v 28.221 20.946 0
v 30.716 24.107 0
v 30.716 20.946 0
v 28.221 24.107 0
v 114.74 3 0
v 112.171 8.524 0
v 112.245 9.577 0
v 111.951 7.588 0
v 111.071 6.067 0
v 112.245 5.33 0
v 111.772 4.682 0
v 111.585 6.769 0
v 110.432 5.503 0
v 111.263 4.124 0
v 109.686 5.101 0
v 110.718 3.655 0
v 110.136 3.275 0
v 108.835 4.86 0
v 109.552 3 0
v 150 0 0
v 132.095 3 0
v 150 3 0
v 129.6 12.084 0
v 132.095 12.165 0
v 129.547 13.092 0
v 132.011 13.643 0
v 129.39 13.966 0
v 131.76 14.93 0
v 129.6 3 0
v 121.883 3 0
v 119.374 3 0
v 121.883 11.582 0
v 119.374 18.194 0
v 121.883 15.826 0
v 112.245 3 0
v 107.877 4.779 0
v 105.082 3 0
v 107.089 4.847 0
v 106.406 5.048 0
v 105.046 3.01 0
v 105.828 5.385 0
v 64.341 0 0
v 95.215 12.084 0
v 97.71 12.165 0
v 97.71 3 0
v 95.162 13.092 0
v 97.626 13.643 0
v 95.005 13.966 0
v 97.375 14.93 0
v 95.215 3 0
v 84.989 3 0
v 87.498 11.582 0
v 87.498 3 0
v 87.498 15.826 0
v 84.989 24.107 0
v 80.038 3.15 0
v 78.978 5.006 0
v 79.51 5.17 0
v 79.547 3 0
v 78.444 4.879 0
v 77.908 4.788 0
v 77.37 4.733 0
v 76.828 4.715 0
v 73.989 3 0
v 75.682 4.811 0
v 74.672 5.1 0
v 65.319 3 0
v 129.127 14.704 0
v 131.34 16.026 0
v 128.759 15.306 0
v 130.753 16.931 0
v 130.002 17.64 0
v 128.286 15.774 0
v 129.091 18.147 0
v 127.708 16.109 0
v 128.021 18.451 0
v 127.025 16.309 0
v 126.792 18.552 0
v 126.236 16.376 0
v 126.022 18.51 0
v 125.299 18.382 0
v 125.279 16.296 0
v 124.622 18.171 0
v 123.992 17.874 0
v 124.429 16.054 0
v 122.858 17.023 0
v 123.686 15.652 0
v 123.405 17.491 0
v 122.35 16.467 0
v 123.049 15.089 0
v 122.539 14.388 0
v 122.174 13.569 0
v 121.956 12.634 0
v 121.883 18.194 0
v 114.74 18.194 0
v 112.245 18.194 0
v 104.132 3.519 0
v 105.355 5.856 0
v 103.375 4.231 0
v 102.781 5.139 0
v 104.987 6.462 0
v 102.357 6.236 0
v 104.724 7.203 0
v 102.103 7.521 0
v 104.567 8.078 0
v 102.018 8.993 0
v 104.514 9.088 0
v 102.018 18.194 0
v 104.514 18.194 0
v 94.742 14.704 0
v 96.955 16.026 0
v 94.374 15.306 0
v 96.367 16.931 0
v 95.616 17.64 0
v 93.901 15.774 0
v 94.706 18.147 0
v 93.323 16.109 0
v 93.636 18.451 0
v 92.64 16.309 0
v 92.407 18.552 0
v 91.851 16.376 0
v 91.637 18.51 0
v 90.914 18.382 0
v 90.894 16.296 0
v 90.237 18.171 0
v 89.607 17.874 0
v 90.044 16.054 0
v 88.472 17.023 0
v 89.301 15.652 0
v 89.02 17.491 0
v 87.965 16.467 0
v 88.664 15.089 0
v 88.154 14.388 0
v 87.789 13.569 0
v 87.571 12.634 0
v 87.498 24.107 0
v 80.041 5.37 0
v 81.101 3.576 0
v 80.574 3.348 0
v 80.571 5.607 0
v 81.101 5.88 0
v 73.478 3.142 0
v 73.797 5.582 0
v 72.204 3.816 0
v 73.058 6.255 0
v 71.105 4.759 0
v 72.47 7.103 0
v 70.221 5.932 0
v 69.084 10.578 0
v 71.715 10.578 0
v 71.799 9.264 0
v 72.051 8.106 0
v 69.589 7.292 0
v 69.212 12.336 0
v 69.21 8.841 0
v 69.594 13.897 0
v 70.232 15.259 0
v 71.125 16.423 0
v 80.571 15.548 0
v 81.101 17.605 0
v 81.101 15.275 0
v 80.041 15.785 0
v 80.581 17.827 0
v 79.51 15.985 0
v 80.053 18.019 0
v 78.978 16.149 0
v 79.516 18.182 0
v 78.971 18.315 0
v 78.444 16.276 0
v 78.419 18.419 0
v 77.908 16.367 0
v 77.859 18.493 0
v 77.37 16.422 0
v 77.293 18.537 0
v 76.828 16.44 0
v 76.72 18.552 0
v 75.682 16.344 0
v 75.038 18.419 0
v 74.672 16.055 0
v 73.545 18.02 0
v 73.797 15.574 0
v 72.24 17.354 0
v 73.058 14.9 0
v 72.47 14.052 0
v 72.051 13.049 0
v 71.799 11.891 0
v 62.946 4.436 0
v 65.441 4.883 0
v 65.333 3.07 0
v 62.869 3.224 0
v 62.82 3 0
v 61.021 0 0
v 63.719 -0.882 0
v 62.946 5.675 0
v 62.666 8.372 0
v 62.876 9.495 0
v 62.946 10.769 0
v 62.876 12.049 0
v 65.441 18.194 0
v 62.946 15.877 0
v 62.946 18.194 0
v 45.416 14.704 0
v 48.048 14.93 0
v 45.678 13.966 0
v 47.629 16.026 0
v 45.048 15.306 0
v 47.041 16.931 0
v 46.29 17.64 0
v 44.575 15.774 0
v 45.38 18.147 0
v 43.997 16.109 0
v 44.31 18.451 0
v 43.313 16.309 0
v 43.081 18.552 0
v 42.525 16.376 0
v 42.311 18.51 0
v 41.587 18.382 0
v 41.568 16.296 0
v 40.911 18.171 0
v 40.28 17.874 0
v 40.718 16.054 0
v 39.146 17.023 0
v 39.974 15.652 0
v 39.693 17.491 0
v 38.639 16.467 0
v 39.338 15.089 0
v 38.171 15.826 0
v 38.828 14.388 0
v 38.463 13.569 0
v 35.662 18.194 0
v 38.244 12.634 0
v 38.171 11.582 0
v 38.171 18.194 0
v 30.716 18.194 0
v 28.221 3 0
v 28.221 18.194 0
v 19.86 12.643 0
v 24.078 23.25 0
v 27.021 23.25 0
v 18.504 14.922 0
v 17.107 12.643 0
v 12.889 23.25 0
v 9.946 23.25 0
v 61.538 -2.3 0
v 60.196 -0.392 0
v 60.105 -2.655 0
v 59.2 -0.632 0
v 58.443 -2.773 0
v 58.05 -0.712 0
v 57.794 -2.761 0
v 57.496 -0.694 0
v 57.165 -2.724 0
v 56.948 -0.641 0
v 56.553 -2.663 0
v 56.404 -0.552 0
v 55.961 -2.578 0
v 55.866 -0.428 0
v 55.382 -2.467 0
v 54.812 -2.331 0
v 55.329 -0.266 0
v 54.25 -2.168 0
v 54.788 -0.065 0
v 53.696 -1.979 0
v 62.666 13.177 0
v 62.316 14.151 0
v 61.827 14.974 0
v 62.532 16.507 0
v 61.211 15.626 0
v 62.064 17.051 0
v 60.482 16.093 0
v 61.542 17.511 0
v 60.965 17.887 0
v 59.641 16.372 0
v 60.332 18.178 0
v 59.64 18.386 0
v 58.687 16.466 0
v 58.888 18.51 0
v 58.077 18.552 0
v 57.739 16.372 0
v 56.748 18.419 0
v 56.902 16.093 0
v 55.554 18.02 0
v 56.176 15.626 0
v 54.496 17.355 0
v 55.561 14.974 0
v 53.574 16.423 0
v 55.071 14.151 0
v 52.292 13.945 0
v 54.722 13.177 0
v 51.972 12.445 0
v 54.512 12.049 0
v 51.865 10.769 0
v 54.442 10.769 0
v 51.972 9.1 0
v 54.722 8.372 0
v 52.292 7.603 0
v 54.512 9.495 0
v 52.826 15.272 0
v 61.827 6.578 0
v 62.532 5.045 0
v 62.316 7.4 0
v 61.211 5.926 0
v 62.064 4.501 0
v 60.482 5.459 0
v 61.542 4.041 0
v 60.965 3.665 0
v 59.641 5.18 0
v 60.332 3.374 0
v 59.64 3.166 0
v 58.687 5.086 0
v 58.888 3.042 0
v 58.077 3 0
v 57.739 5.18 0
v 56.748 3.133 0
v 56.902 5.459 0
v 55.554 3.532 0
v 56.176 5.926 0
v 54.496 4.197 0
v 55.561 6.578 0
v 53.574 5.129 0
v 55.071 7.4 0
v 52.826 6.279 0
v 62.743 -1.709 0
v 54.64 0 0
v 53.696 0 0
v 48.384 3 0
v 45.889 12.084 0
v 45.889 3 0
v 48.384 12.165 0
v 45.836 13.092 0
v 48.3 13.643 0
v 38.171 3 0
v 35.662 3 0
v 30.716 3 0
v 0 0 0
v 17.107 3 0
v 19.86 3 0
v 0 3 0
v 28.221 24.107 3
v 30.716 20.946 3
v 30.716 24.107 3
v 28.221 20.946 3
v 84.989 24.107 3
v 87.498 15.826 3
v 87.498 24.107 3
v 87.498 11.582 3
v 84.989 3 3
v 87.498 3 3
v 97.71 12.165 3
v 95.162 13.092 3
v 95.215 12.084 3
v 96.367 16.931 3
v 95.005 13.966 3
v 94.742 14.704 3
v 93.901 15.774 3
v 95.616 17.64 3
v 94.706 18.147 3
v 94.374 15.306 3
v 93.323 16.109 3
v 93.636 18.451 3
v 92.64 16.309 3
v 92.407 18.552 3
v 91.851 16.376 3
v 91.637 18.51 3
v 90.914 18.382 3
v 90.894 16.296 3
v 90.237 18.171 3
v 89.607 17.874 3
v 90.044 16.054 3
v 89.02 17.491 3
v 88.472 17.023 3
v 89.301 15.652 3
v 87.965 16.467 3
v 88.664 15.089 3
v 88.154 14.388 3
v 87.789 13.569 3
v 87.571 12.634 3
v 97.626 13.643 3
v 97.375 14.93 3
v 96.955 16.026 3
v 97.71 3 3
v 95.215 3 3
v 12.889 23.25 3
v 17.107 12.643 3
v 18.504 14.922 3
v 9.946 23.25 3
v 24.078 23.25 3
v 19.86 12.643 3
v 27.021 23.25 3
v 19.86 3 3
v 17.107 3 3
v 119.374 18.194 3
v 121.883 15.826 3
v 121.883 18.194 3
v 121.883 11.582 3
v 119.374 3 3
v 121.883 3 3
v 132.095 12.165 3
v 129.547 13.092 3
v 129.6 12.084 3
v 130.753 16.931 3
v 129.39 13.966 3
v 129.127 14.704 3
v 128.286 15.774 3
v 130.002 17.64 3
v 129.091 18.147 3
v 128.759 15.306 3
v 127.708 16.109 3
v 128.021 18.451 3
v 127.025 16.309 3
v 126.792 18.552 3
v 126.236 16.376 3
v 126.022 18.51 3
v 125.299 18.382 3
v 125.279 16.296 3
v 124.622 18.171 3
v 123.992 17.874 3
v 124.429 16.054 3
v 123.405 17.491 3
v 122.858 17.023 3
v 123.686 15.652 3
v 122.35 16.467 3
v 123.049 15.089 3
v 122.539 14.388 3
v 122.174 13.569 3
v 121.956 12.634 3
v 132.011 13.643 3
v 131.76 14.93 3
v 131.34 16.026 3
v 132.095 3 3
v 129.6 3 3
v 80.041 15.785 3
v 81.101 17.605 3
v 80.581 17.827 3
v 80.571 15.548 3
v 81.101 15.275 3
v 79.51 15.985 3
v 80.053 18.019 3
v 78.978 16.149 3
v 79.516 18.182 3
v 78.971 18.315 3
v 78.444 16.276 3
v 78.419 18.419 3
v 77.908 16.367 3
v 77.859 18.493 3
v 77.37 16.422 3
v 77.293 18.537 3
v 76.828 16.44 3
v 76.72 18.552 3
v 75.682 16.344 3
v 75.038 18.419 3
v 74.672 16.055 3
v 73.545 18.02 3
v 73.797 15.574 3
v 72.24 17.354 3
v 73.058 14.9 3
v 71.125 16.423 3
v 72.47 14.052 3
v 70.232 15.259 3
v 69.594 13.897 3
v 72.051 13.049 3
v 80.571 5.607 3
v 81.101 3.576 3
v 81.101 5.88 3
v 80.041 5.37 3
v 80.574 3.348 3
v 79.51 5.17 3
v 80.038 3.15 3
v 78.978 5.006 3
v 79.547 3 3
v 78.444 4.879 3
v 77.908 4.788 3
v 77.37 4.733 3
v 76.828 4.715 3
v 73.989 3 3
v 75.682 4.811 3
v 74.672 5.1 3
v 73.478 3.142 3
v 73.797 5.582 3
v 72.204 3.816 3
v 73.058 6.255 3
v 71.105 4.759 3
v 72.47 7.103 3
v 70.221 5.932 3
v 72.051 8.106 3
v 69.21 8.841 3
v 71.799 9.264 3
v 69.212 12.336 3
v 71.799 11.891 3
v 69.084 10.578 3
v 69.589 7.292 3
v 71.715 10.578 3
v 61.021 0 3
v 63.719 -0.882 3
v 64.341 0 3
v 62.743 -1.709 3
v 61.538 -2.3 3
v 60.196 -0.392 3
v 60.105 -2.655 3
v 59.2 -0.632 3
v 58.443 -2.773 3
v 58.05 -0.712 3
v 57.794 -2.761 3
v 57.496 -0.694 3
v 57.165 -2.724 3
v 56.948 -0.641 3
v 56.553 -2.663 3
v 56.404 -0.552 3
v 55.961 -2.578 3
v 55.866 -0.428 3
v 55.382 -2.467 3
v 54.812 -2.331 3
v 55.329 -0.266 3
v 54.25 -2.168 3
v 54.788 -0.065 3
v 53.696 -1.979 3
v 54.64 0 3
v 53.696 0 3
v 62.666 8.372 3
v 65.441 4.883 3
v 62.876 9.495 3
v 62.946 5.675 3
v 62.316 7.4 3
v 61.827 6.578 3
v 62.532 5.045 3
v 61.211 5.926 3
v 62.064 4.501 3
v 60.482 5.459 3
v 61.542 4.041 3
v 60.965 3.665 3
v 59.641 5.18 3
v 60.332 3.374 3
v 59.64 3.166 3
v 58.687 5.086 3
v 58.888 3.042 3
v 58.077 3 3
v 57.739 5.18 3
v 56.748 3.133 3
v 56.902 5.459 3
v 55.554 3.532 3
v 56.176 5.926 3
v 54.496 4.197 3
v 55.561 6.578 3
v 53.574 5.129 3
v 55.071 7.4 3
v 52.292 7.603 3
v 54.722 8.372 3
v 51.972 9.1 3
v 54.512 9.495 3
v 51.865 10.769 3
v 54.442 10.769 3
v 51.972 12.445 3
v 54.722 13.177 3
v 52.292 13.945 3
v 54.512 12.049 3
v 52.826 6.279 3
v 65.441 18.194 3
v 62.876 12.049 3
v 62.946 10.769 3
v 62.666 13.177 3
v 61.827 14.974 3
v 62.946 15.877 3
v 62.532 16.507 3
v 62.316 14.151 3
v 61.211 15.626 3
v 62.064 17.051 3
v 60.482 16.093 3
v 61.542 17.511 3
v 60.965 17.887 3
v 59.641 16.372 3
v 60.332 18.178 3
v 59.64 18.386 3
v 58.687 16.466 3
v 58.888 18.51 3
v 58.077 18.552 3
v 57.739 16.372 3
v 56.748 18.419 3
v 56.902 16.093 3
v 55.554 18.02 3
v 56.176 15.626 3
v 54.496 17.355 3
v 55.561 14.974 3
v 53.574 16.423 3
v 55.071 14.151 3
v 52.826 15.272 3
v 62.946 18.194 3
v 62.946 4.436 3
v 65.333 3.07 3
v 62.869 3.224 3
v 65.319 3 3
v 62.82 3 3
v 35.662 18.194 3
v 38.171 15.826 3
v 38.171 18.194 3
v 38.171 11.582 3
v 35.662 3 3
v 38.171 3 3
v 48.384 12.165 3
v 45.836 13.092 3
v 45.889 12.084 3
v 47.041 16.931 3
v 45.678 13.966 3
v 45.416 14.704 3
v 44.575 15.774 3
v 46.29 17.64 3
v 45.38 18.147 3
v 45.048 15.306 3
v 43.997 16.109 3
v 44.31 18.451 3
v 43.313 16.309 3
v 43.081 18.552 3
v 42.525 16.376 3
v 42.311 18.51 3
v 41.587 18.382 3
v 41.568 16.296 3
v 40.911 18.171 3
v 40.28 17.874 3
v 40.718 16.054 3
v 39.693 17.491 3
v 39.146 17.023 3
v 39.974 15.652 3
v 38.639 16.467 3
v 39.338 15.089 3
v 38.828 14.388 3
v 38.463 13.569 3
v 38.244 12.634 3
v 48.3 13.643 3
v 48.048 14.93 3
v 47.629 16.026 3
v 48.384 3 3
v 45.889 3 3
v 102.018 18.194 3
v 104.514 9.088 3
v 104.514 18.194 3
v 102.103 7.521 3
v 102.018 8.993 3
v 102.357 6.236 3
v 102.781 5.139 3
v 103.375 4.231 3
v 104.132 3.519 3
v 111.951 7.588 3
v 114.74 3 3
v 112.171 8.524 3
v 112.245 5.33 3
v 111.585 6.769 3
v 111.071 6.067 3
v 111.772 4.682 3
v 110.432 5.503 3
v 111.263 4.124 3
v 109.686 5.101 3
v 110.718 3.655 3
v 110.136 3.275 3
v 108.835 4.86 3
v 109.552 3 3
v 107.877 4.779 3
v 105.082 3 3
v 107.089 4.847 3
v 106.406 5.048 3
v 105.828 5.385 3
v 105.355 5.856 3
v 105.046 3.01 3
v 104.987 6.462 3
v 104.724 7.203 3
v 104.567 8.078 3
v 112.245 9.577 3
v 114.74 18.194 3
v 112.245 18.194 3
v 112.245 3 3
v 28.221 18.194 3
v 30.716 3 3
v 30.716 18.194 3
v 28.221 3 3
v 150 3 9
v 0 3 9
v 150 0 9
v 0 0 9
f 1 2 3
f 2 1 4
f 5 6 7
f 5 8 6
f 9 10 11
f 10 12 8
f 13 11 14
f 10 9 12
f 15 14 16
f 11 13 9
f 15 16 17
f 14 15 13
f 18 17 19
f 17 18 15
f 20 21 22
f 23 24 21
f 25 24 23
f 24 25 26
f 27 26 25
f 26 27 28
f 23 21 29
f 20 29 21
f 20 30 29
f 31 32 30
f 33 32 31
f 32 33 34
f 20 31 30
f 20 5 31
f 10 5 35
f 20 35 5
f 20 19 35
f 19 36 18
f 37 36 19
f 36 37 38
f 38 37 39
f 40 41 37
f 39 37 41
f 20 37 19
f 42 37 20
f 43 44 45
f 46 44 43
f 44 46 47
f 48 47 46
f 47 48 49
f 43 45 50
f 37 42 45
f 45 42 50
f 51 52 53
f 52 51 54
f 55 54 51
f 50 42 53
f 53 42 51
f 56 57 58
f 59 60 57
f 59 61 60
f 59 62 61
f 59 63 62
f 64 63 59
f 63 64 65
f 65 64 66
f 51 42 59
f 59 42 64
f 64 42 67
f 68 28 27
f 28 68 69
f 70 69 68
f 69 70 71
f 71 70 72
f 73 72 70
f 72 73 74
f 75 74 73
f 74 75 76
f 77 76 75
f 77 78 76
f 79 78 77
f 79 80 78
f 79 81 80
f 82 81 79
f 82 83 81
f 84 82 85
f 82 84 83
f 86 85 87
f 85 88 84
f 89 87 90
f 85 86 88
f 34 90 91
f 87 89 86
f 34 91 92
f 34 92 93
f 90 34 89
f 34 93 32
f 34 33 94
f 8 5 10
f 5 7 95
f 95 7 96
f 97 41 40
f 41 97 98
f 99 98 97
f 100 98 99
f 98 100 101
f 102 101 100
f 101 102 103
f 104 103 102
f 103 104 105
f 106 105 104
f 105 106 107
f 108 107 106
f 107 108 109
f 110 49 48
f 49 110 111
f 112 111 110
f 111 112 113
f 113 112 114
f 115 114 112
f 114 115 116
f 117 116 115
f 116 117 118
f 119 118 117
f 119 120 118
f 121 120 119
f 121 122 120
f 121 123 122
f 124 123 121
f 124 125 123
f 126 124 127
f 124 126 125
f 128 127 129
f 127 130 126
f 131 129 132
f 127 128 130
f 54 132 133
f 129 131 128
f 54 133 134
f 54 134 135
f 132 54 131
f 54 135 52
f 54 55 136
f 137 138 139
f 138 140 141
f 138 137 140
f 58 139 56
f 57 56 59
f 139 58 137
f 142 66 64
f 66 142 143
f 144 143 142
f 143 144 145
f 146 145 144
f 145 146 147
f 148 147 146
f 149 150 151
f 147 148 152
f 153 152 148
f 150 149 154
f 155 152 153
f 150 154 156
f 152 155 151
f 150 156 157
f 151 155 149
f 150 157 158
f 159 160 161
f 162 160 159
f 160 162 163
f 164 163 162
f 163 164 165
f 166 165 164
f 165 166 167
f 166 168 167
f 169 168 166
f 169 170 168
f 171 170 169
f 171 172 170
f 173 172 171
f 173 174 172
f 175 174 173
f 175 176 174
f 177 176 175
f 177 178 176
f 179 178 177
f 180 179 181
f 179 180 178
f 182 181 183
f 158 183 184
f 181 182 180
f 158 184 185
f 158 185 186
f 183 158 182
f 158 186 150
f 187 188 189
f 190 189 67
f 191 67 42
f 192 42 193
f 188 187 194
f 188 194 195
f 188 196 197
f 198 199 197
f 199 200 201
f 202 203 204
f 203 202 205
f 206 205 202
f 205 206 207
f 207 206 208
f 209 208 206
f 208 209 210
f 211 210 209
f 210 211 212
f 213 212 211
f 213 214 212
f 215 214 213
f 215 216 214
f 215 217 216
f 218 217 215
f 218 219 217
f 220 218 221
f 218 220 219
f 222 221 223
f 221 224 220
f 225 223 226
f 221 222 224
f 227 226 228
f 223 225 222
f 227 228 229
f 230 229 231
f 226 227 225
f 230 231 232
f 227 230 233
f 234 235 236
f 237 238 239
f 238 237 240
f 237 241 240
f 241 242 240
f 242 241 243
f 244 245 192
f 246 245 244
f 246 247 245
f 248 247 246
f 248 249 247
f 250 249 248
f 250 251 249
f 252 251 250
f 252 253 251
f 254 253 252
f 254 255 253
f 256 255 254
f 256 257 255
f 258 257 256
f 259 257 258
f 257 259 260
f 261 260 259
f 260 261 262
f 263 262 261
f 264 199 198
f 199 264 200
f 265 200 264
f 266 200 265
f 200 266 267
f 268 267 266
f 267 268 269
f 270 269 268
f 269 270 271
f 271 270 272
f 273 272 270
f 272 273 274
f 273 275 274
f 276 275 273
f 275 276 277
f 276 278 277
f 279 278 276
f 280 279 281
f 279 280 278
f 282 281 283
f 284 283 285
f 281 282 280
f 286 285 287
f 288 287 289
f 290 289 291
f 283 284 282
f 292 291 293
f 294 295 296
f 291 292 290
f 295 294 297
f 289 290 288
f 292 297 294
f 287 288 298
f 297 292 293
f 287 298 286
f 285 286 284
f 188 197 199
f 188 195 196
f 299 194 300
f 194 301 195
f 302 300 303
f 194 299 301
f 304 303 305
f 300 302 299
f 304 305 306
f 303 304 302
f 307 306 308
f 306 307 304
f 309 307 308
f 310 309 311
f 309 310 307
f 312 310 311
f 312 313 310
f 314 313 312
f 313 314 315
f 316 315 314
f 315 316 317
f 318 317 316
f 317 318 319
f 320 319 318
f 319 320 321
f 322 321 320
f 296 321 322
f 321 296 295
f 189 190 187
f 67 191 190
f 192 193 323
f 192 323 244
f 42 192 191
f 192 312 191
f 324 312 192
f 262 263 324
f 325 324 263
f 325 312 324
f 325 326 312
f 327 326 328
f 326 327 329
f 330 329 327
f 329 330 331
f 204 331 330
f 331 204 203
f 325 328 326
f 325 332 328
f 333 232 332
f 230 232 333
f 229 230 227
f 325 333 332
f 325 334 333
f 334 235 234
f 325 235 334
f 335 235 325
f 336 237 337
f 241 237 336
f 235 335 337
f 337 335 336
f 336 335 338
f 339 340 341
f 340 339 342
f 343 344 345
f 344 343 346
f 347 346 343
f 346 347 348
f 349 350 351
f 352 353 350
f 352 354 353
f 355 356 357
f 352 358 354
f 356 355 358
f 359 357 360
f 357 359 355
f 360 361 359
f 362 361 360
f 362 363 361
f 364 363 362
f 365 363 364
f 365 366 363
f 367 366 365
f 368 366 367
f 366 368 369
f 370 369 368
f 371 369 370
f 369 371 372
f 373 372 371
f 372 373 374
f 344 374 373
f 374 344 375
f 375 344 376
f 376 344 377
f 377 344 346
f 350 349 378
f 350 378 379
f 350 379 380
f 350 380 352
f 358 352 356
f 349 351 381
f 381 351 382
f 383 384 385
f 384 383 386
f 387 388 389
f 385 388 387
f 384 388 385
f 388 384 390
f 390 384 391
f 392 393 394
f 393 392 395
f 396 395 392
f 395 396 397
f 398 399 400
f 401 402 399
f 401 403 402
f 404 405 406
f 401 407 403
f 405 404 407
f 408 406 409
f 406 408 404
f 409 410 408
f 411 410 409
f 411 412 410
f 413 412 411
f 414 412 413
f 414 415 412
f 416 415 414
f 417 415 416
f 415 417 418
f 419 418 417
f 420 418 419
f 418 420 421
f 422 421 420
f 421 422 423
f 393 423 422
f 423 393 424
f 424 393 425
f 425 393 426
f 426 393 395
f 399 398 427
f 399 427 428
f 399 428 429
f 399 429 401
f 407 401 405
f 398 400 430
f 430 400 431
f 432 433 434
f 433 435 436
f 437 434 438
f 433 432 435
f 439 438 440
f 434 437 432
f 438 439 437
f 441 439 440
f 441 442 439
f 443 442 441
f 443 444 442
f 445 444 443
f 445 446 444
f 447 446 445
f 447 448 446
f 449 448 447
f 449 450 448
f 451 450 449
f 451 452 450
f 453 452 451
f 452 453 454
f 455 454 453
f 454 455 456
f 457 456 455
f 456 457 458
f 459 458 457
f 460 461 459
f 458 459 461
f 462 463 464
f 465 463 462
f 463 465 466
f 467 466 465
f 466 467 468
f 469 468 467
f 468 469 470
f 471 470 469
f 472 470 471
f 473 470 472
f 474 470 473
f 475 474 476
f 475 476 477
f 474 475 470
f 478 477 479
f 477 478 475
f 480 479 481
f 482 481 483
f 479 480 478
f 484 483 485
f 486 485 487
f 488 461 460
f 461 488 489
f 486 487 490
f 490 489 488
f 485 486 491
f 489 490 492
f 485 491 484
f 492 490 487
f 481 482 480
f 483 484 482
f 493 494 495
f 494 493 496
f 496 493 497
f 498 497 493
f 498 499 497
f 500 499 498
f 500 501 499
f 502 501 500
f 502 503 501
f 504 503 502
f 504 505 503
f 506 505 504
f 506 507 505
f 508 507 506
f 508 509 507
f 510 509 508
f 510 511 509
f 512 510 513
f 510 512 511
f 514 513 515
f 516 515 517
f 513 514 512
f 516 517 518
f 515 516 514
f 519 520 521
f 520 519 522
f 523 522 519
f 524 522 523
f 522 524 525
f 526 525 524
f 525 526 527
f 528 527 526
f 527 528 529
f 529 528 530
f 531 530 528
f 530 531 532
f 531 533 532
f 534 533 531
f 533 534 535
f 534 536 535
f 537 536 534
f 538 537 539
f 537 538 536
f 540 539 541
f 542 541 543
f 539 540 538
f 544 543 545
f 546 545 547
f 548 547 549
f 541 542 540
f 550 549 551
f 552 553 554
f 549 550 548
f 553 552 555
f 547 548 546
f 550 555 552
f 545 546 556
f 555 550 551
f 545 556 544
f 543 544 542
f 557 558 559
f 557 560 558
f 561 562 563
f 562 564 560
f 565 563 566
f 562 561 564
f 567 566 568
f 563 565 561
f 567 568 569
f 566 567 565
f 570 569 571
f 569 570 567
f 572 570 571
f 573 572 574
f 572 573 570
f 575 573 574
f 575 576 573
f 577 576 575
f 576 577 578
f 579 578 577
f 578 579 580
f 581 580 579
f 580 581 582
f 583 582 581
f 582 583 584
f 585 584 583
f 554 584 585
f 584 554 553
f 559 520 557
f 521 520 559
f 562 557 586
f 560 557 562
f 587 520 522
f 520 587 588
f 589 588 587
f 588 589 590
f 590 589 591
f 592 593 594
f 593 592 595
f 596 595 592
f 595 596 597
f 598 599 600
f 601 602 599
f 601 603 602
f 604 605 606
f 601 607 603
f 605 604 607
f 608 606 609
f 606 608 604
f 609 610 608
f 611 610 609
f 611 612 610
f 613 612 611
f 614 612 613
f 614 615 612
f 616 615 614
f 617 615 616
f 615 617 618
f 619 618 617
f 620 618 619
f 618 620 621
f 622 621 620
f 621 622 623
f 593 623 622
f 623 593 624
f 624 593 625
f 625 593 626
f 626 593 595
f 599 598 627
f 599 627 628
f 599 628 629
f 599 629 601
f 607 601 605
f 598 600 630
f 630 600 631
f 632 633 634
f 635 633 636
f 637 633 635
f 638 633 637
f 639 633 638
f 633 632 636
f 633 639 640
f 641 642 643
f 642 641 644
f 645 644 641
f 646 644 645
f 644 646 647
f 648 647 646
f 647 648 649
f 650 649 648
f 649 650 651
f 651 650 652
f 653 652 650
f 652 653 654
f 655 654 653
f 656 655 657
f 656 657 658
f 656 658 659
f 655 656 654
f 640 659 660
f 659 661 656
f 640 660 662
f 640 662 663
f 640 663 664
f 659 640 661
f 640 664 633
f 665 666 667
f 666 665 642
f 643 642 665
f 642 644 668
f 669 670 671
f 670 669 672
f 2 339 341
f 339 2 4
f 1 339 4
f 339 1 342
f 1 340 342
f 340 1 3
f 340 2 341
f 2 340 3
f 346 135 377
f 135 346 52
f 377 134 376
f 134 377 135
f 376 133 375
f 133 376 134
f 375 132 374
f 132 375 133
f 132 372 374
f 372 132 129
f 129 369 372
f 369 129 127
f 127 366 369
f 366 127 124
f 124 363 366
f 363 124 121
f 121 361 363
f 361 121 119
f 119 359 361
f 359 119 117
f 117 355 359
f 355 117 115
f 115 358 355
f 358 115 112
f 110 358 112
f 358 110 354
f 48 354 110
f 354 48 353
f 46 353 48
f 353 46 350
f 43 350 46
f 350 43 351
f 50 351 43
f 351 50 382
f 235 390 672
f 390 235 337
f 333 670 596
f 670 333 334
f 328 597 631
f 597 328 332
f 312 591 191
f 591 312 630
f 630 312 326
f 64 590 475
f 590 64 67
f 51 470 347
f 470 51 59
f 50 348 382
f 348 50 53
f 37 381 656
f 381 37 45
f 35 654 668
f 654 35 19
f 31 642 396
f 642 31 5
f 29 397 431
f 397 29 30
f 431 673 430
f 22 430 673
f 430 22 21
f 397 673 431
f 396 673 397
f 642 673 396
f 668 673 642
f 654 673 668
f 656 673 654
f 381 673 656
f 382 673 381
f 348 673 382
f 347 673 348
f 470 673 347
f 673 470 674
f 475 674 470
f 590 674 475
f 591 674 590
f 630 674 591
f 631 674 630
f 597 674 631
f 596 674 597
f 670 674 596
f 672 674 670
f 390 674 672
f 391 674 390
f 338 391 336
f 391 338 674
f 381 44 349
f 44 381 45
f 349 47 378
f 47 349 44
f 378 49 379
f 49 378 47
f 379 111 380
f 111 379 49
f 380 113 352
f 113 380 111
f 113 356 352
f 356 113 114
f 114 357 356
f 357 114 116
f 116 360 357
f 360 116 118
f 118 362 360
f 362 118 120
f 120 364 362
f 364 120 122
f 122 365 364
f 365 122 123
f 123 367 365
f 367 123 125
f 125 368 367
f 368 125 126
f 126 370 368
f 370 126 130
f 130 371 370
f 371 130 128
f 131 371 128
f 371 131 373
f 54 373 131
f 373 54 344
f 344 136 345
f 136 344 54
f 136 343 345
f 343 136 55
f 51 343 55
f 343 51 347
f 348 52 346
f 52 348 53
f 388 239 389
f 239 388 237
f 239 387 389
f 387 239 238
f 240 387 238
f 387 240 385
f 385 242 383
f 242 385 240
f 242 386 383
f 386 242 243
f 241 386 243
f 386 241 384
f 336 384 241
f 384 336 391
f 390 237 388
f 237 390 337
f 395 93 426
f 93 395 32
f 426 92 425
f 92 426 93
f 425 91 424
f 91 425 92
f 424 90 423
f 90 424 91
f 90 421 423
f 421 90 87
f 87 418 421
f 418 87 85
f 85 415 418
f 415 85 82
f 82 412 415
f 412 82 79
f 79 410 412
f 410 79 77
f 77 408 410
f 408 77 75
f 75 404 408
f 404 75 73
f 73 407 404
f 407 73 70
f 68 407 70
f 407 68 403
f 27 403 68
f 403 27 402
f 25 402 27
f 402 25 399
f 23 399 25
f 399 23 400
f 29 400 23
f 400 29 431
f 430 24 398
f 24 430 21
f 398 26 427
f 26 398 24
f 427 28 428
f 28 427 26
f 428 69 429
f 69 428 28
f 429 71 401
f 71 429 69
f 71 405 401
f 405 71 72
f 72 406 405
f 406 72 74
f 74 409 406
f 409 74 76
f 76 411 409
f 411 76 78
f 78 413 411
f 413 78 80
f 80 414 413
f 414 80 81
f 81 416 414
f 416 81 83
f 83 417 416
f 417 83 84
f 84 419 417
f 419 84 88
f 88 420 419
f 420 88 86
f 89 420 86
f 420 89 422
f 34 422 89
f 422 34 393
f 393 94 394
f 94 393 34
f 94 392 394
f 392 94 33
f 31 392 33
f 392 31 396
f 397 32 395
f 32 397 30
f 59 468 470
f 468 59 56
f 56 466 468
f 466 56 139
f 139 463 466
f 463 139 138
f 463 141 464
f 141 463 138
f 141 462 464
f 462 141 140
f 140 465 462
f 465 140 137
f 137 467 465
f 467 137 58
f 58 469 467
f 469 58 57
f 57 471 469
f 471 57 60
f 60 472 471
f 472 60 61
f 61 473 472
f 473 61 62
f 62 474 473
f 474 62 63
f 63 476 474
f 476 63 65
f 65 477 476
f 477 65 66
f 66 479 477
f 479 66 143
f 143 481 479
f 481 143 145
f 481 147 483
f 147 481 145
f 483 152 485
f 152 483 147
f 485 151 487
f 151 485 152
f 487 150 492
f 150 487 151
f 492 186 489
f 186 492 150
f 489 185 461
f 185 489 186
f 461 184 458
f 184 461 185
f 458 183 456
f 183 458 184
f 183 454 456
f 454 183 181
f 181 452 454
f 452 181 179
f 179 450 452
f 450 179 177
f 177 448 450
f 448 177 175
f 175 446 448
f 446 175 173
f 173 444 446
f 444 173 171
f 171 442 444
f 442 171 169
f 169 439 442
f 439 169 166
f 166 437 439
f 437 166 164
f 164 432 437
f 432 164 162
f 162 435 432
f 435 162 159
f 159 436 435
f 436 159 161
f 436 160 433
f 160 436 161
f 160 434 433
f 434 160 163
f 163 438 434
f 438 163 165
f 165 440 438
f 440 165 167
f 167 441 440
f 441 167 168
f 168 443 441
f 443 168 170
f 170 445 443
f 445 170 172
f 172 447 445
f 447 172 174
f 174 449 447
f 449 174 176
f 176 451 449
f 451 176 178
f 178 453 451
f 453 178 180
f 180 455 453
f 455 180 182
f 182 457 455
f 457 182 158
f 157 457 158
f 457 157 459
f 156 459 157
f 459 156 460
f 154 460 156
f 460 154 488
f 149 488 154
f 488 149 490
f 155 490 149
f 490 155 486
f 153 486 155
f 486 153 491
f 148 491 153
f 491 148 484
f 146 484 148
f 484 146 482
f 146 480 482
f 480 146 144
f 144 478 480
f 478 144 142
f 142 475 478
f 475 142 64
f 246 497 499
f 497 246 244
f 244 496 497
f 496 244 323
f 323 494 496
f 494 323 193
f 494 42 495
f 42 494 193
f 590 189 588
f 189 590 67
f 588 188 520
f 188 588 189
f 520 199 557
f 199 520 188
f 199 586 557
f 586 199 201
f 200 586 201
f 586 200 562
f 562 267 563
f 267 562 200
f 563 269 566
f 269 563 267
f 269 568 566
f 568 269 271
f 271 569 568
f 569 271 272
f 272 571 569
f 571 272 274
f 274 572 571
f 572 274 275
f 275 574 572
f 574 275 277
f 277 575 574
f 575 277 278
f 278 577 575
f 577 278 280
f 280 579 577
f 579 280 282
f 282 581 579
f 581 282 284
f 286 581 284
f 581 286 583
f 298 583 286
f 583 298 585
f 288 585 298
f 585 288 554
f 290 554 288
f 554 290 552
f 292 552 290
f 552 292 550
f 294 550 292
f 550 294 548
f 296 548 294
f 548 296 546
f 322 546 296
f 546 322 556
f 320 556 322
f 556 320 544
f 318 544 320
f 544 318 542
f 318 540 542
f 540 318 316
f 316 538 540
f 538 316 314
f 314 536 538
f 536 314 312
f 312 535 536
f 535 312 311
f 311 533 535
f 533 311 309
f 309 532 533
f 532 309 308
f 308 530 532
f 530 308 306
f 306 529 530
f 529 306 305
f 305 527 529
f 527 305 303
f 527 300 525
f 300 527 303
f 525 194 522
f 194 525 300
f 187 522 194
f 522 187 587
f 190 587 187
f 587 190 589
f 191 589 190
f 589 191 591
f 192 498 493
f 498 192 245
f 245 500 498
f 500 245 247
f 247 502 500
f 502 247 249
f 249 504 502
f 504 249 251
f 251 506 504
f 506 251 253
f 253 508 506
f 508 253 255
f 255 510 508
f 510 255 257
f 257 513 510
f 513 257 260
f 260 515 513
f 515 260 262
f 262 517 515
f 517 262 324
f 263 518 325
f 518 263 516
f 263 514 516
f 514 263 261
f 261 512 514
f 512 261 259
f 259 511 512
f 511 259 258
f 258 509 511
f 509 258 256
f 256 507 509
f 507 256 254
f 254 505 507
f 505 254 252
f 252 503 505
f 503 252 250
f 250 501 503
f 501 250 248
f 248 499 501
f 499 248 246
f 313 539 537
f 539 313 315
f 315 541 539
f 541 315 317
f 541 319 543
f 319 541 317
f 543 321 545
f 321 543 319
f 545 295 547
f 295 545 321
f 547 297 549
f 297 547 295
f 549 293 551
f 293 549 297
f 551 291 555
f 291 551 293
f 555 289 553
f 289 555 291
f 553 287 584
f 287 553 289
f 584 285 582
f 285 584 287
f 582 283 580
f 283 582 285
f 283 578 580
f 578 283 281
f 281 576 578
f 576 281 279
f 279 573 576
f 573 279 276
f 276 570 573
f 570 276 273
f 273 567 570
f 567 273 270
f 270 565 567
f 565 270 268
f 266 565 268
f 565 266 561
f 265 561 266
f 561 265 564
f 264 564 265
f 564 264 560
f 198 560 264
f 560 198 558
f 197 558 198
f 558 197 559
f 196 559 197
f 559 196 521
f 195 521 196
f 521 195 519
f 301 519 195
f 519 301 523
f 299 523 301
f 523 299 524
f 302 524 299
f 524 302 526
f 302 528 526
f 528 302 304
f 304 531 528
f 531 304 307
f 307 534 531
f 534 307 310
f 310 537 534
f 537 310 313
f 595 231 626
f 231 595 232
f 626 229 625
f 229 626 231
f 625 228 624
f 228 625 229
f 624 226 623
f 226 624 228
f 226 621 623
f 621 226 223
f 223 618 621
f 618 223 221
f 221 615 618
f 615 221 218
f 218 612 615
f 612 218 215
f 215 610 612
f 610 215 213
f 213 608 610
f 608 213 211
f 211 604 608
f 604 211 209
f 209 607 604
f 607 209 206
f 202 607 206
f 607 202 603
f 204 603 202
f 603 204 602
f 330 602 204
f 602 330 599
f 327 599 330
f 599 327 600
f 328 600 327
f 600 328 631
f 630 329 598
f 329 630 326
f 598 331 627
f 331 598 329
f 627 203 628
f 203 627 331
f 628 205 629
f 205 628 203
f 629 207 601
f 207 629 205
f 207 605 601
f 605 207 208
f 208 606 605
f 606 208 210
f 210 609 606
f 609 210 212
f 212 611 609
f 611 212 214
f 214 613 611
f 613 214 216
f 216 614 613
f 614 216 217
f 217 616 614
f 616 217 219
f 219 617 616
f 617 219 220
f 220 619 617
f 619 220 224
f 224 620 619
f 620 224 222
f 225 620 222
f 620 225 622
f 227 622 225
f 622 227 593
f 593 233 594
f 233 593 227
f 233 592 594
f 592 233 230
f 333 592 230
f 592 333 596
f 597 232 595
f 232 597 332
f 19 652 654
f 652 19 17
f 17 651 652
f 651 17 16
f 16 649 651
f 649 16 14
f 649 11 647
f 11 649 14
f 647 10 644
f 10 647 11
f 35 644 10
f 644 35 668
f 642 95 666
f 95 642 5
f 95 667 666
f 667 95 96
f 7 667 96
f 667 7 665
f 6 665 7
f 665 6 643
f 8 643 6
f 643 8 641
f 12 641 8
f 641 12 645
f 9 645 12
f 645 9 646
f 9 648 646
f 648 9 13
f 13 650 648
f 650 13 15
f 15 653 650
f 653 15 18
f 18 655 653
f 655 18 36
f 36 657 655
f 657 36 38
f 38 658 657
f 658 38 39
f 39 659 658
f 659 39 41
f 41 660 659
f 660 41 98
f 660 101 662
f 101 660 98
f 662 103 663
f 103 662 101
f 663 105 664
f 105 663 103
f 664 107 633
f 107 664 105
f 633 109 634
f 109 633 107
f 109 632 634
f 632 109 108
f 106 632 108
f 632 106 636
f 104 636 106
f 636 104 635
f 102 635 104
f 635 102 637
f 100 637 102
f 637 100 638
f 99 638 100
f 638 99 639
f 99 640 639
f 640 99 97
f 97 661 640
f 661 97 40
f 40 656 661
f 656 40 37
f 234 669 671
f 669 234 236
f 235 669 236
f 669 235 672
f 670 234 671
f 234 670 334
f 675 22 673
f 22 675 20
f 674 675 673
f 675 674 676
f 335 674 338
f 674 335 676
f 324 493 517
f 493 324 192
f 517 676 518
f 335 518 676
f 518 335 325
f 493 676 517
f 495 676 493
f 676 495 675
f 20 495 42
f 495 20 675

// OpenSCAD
translate([10, 3, 0])
linear_extrude(height=3)
    text("Yingchun", 20, "Cascadia Code Semibold");

cube([150, 3, 9]);
